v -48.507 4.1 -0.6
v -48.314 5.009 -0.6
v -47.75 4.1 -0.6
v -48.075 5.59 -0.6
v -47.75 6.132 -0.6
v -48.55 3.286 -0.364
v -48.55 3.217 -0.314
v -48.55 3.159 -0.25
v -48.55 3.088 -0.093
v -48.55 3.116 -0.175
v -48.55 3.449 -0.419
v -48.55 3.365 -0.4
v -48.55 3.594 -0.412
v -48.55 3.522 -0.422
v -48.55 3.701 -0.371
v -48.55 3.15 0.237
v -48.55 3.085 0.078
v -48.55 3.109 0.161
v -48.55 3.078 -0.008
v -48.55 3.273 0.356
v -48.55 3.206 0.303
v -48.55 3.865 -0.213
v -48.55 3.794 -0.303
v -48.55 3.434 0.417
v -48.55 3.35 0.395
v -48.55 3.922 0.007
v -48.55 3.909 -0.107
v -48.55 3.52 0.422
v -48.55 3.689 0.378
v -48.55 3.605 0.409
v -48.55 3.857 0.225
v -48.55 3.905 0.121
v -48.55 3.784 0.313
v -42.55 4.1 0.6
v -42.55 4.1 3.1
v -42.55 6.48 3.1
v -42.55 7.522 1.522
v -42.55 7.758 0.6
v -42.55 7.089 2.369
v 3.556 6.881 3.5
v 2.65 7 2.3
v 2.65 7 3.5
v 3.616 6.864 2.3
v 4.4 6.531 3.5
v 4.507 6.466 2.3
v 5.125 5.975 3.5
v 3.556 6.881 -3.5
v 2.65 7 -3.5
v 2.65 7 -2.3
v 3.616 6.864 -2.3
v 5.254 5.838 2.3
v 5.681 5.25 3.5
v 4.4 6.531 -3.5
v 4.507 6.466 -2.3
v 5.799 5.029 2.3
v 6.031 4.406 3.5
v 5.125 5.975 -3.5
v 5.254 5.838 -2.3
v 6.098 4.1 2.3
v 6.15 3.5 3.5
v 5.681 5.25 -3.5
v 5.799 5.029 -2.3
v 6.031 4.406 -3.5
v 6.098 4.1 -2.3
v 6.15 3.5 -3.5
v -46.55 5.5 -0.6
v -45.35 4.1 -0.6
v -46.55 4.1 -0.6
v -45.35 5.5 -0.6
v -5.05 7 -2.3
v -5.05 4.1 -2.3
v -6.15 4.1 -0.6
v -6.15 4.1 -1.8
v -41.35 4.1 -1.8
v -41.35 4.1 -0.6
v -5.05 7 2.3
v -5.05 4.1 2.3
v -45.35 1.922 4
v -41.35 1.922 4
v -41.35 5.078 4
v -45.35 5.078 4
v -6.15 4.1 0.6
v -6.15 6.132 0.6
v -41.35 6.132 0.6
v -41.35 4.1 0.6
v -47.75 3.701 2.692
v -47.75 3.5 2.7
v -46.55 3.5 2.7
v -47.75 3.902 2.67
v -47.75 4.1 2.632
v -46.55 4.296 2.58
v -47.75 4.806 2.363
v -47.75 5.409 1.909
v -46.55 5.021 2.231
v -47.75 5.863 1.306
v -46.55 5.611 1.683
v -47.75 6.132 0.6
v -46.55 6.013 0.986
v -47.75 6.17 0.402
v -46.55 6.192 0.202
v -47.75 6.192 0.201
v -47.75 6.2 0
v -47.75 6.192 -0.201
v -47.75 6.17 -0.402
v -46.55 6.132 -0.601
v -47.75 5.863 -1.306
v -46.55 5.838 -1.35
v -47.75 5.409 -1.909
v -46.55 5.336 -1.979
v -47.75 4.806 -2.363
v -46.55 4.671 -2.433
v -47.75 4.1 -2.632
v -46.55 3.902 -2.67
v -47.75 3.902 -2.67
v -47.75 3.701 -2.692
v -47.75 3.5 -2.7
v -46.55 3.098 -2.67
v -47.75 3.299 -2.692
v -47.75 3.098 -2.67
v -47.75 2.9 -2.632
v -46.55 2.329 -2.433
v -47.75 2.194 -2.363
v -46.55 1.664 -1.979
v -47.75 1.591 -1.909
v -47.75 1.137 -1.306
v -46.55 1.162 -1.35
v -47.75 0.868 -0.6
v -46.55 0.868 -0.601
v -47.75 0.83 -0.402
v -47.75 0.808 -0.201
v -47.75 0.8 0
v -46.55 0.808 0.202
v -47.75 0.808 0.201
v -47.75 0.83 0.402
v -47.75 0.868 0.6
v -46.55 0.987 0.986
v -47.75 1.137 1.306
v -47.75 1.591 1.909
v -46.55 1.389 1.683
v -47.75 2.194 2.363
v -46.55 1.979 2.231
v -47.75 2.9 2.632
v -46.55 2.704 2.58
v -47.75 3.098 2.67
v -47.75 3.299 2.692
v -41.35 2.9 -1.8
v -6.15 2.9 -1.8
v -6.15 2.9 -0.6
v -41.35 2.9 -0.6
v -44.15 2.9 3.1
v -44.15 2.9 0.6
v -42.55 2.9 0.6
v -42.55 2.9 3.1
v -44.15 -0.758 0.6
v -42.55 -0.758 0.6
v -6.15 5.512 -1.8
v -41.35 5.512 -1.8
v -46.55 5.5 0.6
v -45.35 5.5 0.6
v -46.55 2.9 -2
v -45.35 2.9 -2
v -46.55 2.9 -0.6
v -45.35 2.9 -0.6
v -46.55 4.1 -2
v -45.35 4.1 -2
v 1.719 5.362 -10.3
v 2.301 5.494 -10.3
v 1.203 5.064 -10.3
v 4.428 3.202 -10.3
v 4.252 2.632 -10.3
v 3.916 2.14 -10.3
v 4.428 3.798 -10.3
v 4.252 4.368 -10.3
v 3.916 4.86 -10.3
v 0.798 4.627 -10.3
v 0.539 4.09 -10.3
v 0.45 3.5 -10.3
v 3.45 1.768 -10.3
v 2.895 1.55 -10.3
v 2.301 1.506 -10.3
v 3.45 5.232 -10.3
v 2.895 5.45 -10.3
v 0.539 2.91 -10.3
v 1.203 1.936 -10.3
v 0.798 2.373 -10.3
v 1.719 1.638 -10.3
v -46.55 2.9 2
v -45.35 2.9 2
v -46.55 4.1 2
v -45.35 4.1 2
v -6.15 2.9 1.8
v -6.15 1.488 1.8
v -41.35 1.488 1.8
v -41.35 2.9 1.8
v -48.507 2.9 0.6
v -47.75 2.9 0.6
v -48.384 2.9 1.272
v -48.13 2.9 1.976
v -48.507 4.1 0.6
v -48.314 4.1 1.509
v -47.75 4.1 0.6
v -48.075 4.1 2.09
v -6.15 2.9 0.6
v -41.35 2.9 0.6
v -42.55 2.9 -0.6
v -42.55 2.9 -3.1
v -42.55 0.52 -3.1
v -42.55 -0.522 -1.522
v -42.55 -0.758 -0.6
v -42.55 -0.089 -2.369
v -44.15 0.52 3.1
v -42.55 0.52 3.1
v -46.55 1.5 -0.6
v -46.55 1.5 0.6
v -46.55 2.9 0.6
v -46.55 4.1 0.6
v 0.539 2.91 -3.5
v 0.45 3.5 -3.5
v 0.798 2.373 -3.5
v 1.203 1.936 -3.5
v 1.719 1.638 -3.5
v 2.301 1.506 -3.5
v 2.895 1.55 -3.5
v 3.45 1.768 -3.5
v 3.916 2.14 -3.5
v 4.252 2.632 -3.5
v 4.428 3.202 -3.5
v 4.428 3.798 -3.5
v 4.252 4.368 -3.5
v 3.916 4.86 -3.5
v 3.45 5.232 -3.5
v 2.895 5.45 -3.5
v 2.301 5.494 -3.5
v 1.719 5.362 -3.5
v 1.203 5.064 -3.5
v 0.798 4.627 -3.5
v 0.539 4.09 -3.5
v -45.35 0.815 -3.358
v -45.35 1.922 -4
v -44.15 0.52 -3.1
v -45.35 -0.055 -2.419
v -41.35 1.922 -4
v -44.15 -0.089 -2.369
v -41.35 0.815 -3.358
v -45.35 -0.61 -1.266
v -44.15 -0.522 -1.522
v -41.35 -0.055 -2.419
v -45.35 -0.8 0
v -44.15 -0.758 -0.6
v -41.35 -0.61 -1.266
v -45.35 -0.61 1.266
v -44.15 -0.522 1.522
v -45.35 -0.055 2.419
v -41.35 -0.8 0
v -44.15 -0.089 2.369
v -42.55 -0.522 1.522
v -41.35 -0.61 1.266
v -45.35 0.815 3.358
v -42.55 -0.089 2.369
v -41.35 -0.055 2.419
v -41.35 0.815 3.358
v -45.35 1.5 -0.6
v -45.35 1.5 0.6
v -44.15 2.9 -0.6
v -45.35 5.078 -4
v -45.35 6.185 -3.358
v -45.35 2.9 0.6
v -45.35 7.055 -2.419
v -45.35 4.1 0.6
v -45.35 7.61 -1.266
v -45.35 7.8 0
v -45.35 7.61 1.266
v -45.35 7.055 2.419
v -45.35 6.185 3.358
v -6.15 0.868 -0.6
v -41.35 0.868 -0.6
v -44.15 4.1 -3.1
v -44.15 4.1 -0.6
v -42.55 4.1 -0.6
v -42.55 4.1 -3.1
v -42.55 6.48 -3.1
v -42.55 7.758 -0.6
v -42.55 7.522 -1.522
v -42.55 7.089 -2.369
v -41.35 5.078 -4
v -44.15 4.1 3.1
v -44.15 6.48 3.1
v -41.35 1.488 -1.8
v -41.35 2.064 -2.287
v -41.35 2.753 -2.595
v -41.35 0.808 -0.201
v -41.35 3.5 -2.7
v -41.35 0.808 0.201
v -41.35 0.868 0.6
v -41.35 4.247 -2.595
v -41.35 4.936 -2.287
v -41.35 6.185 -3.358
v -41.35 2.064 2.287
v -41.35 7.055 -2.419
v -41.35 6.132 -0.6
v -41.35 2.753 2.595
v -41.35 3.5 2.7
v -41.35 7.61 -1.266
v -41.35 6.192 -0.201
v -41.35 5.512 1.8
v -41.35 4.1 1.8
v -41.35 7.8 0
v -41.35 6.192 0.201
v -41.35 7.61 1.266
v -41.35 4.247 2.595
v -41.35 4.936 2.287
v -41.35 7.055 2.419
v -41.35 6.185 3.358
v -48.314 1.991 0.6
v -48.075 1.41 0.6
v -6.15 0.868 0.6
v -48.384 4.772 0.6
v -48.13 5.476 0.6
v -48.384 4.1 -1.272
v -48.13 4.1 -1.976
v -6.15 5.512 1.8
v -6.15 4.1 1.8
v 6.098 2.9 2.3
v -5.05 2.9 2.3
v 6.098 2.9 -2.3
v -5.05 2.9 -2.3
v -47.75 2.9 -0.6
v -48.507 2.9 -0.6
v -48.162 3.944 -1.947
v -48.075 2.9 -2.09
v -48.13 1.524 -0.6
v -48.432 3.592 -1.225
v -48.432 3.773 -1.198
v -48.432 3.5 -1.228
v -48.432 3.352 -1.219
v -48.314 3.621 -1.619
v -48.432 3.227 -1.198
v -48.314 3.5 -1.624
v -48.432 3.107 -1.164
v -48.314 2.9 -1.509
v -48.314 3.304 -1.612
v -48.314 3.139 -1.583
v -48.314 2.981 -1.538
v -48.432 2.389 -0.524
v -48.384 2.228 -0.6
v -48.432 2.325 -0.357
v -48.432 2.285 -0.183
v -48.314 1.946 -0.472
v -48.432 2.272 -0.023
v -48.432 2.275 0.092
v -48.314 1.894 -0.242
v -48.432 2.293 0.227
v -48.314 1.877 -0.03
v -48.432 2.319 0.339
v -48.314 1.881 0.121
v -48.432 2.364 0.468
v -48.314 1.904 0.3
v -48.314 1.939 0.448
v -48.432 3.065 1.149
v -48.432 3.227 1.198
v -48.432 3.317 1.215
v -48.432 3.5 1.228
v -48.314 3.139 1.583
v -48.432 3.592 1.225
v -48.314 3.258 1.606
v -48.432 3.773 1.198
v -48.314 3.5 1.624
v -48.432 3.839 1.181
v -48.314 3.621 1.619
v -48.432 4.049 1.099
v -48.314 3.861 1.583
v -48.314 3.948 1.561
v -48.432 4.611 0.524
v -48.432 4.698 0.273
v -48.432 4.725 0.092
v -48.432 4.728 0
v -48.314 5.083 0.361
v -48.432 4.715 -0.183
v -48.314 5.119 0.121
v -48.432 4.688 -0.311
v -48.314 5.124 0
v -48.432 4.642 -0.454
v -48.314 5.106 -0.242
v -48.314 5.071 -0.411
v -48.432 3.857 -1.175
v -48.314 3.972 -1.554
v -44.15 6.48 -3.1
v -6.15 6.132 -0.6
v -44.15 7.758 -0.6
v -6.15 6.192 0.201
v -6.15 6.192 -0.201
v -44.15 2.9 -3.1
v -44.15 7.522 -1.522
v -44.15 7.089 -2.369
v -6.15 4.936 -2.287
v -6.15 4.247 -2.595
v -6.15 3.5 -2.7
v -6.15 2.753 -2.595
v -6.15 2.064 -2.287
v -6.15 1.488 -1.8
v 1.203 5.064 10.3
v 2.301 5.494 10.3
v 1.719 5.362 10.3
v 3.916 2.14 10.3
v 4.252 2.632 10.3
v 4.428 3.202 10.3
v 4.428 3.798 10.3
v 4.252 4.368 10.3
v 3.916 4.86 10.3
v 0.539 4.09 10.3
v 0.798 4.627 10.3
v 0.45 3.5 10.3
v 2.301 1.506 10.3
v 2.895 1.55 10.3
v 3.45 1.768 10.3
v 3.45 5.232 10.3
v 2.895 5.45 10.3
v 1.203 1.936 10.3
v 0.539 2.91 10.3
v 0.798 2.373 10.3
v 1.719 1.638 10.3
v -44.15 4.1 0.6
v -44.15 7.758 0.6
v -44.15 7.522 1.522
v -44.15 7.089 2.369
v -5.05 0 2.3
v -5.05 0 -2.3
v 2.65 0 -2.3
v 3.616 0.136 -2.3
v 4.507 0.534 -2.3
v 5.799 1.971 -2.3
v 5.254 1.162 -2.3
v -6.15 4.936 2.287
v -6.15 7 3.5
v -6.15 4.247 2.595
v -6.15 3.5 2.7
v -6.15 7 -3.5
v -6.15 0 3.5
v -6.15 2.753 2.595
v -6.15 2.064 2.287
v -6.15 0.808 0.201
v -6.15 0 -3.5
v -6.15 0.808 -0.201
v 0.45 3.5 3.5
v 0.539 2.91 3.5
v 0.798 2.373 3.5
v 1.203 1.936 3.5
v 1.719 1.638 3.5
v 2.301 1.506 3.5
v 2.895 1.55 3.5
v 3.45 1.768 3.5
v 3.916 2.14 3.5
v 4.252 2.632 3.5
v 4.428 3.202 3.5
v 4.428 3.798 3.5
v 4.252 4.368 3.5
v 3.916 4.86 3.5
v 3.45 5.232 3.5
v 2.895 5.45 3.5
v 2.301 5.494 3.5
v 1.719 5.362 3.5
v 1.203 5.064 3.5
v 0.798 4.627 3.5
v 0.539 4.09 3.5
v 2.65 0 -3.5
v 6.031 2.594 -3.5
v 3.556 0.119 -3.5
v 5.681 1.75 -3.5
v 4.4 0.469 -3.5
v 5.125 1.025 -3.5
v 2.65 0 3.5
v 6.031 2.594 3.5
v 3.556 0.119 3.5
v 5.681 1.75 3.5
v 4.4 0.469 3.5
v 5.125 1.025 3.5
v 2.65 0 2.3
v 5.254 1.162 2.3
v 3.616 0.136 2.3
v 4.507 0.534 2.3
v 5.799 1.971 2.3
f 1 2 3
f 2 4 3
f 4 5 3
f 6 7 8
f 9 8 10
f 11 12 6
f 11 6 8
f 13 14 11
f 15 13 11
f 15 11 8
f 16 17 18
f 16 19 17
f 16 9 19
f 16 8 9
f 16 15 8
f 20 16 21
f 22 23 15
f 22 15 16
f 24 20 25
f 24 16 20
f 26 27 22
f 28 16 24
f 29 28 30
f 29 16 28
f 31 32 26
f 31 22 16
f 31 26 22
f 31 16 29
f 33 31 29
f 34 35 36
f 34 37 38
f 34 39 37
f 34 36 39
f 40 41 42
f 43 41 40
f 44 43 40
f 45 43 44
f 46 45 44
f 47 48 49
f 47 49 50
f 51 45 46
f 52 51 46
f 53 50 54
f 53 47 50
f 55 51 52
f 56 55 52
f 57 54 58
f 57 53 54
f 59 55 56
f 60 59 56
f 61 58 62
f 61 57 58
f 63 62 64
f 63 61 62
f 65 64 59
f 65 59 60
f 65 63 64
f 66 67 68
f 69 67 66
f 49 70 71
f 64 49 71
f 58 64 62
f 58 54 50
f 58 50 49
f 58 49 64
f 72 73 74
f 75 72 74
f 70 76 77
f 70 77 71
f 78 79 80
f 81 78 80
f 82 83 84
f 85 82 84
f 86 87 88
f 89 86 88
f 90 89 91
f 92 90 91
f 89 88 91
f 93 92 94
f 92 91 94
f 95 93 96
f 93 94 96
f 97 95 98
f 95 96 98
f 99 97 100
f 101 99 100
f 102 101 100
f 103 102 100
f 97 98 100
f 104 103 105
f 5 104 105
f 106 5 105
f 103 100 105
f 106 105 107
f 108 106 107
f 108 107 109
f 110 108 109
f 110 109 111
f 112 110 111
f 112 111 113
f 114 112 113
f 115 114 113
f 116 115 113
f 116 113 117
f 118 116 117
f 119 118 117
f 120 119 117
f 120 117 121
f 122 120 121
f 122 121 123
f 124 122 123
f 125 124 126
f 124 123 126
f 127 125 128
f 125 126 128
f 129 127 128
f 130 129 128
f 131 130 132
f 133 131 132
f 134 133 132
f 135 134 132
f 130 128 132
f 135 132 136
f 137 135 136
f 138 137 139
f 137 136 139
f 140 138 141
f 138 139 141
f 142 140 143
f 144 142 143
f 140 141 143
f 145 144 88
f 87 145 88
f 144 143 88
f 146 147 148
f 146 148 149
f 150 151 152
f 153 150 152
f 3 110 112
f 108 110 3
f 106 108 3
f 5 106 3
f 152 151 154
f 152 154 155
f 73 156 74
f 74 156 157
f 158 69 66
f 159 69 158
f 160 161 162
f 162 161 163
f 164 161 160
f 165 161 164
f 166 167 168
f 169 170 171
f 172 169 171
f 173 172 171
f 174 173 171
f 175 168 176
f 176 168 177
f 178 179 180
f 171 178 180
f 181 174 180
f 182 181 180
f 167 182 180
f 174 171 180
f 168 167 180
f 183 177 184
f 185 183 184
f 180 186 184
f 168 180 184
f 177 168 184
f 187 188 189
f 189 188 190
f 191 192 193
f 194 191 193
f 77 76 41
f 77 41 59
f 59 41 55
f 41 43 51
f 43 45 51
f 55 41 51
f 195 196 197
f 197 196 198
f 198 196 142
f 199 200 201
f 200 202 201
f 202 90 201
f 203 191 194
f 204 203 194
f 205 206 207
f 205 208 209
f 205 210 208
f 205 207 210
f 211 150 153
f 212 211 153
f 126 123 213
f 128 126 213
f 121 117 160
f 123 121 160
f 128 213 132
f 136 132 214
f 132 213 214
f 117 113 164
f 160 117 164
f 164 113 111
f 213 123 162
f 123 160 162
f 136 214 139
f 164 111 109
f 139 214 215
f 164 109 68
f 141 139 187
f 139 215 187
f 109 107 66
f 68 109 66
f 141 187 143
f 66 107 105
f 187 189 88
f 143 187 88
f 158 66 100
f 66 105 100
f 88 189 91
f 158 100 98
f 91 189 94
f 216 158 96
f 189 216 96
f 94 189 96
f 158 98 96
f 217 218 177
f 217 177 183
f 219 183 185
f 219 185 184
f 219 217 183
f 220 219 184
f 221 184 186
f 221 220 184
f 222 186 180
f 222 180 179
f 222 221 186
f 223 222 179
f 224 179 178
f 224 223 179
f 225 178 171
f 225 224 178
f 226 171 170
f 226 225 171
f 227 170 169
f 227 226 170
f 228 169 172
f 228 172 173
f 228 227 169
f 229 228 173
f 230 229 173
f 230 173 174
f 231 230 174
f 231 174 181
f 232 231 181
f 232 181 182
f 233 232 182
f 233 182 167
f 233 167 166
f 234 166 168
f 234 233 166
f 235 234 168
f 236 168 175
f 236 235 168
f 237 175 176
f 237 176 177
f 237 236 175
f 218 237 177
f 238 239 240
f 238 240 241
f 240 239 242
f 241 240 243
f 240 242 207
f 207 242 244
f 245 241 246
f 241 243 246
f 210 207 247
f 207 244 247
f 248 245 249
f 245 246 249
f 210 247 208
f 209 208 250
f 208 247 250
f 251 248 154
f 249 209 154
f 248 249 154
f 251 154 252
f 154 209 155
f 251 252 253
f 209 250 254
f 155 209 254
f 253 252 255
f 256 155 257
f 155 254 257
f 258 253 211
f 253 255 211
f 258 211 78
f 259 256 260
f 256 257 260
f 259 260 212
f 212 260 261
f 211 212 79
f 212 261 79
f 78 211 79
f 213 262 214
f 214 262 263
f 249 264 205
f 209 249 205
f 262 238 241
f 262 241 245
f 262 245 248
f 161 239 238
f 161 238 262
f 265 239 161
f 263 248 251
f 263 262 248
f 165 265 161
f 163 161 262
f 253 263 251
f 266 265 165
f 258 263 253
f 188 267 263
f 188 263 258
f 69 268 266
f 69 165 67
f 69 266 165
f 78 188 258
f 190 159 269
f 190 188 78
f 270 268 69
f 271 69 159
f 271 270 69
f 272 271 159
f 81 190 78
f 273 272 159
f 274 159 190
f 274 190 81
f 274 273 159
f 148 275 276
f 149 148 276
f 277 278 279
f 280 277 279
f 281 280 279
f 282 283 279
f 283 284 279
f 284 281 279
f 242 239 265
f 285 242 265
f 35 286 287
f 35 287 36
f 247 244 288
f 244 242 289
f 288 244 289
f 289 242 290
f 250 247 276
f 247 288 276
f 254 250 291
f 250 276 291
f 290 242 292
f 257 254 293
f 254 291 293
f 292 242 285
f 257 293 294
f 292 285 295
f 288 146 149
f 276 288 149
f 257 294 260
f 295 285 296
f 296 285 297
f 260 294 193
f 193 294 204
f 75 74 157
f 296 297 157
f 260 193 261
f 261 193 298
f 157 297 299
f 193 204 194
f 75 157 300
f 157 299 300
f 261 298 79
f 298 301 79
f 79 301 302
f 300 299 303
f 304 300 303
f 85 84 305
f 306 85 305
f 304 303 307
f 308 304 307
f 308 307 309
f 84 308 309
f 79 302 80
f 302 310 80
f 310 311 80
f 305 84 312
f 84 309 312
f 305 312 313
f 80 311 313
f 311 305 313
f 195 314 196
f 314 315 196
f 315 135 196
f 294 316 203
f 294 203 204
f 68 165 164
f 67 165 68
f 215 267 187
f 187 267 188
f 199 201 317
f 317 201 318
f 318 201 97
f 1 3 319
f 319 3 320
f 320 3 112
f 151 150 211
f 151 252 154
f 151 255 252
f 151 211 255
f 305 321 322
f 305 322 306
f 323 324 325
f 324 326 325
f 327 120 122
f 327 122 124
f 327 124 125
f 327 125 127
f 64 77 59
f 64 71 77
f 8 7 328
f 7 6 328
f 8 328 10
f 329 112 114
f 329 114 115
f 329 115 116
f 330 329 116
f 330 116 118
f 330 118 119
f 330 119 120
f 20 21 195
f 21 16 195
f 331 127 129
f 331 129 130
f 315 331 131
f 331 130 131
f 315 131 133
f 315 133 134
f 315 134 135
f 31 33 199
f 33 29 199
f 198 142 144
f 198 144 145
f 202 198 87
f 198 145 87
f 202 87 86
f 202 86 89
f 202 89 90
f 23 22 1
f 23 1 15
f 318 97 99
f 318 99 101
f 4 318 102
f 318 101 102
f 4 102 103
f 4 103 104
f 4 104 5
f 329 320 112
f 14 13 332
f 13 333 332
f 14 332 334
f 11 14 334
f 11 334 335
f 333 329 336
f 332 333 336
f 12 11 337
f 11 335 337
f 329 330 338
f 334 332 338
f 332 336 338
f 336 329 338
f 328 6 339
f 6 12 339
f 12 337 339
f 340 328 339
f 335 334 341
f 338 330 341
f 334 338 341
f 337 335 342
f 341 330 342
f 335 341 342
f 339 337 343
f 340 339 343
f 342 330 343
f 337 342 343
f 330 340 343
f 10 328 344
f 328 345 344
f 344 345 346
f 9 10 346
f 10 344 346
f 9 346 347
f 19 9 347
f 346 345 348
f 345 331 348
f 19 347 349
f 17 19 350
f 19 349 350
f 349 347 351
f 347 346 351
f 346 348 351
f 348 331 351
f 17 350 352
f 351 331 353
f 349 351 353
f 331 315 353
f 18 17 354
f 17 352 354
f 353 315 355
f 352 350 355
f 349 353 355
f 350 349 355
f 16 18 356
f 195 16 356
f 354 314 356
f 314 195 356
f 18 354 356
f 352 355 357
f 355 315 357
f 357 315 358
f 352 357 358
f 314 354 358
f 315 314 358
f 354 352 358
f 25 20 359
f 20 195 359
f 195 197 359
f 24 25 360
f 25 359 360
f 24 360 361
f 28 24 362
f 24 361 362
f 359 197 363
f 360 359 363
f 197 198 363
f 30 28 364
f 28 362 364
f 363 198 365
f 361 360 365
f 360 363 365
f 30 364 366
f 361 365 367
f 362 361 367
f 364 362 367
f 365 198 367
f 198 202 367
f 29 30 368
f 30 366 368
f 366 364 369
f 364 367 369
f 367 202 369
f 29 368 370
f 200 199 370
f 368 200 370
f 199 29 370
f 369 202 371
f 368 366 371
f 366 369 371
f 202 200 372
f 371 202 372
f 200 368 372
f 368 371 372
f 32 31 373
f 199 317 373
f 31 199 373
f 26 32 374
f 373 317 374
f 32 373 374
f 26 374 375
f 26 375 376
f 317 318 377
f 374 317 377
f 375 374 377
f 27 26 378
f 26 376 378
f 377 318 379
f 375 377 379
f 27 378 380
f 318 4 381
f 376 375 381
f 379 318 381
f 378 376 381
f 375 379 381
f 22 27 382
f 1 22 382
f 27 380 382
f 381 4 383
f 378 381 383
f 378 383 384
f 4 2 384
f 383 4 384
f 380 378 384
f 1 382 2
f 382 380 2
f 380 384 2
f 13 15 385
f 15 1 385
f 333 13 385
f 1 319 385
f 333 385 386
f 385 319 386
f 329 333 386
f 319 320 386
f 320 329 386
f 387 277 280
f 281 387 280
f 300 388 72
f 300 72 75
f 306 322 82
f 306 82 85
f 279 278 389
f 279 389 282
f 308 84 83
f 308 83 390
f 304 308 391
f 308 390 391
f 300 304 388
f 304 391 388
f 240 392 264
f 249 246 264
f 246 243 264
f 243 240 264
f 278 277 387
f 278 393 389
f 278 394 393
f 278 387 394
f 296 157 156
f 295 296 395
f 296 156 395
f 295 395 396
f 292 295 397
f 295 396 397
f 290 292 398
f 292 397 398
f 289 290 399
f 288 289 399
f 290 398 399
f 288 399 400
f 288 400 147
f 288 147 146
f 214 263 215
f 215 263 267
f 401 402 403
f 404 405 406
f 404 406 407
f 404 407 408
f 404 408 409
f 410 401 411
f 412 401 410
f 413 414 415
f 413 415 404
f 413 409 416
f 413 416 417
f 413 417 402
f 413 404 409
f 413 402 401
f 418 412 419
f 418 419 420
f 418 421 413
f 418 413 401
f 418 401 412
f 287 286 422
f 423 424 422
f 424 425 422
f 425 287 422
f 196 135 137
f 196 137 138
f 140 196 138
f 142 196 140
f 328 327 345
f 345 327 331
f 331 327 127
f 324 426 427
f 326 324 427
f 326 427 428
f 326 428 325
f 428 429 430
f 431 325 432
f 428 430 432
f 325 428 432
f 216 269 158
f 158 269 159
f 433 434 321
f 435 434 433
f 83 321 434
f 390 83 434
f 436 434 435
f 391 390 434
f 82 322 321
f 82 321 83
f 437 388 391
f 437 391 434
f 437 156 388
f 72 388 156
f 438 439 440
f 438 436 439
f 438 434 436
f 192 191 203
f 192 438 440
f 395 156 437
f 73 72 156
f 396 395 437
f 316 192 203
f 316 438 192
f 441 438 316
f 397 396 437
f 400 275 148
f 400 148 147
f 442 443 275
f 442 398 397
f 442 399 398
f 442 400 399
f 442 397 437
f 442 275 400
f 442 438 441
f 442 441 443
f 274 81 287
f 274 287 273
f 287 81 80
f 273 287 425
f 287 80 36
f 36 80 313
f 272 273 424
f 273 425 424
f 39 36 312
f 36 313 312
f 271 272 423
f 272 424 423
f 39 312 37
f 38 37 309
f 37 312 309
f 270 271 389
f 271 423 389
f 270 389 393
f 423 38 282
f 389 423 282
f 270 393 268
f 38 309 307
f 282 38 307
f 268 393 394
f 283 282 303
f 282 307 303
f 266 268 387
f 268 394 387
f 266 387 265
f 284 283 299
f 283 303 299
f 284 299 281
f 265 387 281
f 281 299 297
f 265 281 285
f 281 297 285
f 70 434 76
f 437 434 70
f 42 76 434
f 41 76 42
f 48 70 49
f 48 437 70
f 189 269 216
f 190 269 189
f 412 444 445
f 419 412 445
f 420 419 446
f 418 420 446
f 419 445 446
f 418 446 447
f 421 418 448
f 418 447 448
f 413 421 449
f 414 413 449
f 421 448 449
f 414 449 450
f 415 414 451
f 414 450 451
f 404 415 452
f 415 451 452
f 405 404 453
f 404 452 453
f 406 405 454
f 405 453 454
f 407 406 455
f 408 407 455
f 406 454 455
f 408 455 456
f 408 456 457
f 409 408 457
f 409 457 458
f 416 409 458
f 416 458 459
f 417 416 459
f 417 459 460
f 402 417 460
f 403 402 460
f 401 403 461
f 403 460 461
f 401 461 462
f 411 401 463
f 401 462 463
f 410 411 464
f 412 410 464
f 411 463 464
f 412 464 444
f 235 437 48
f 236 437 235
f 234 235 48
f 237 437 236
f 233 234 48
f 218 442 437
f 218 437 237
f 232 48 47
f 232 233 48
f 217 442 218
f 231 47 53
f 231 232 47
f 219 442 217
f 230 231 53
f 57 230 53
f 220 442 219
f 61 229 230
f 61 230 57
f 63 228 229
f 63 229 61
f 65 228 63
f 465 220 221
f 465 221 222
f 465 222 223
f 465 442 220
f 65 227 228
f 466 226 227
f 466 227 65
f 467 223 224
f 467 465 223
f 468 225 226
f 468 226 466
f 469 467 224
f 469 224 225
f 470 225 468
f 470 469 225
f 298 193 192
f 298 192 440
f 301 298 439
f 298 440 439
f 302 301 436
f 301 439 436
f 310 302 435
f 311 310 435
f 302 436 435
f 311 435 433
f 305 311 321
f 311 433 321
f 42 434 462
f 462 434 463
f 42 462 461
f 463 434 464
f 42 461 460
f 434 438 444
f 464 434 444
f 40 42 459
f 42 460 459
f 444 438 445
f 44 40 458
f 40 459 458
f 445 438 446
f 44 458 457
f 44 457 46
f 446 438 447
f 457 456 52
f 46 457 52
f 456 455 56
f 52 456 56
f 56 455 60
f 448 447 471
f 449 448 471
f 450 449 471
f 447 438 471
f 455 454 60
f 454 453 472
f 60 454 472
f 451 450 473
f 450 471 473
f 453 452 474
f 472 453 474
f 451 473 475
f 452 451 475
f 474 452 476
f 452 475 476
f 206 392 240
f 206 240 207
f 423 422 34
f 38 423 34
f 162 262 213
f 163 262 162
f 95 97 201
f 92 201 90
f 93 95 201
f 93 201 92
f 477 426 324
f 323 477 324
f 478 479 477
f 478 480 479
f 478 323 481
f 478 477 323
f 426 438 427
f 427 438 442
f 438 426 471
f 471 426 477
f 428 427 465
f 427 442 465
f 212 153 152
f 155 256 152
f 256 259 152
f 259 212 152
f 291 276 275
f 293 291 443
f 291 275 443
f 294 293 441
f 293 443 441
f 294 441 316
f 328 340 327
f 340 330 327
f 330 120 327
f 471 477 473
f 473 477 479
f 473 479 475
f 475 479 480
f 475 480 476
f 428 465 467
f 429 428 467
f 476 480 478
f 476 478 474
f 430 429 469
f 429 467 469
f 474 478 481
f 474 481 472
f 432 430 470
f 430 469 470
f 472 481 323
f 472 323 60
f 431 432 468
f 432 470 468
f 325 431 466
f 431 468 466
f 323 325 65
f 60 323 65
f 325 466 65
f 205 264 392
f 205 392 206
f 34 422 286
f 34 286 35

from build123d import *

# Parameters (mm, degrees)
SKETCH1_W                 = 12.3
SKETCH1_H                 = 7
BOSS_EXTRUDE1_DEPTH       = 7
SKETCH2_W                 = 11.2
SKETCH2_H                 = 4.6
CUT_EXTRUDE1_DEPTH        = 2.9
SKETCH4_R                 = 2
BOSS_EXTRUDE2_DEPTH       = 6.8
SKETCH5_R                 = 2.7
BOSS_EXTRUDE3_DEPTH       = 35.2
SKETCH6_R                 = 4.3
BOSS_EXTRUDE4_DEPTH       = 4
SKETCH7_W                 = 35.2
SKETCH7_H                 = 1.2
CUT_EXTRUDE2_DEPTH        = 2.9
MIRROR4_COPY_1_SKETCH_W   = 35.2
MIRROR4_COPY_1_SKETCH_H   = 1.2
MIRROR4_COPY_1_DEPTH      = 2.9
CUT_EXTRUDE3_REACH        = 48.762
CUT_EXTRUDE3_END_RADIUS   = 4.3
SKETCH9_W                 = 1.6
SKETCH9_H                 = 2.5
MIRROR6_COPY_1_REACH      = 48.762
MIRROR6_COPY_1_END_RADIUS = 4.3
MIRROR6_COPY_1_SKETCH_W   = 1.6
MIRROR6_COPY_1_SKETCH_H   = 2.5
SKETCH10_W                = 1.4
SKETCH10_H                = 1.2
SKETCH10_W_2              = 1.2
SKETCH10_H_2              = 1.4
BOSS_EXTRUDE5_DEPTH       = 1.2
SKETCH11_R                = 2.7
BOSS_EXTRUDE6_DEPTH       = 1.2
SKETCH12_W                = 1.2
SKETCH12_H                = 1.2
BOSS_EXTRUDE9_DEPTH       = 0.8
FILLET3_R                 = 3.5
SKETCH14_W                = 1
SKETCH14_H                = 12
CUT_EXTRUDE8_DEPTH        = 5


with BuildPart() as part:
    # Sketch1 → Boss-Extrude1 (new body)
    with BuildSketch(Plane(origin=(0, 0, 0), x_dir=(1, 0, 0), z_dir=(0, 1, 0))):
        Rectangle(SKETCH1_W, SKETCH1_H)
    extrude(amount=BOSS_EXTRUDE1_DEPTH)

    # Sketch2 → Cut-Extrude1 (cut)
    with BuildSketch(Plane(origin=(0, 7, 0), x_dir=(1, 0, 0), z_dir=(0, 1, 0))):
        with Locations((0.55, 0)):
            Rectangle(SKETCH2_W, SKETCH2_H)
    cut_extrude1 = extrude(amount=-CUT_EXTRUDE1_DEPTH, mode=Mode.SUBTRACT)

    # Mirror1: Cut-Extrude1 across plane
    add(cut_extrude1.mirror(Plane.ZX.offset(3.5)), mode=Mode.SUBTRACT)

    # Sketch4 → Boss-Extrude2 (add)
    with BuildSketch(Plane.XY.offset(3.5)):
        with Locations(Location((2.45, 3.5, 0), (0, 0, 180))):
            Circle(SKETCH4_R)
    boss_extrude2 = extrude(amount=BOSS_EXTRUDE2_DEPTH)

    # Mirror2: Boss-Extrude2 across plane
    add(boss_extrude2.mirror(Plane.XY))

    # Sketch5 → Boss-Extrude3 (add)
    with BuildSketch(Plane.ZY.offset(6.15)):
        with Locations((0, 3.5)):
            Circle(SKETCH5_R)
    extrude(amount=BOSS_EXTRUDE3_DEPTH)

    # Sketch6 → Boss-Extrude4 (add)
    with BuildSketch(Plane.ZY.offset(41.35)):
        with Locations((0, 3.5)):
            Circle(SKETCH6_R)
    extrude(amount=BOSS_EXTRUDE4_DEPTH)

    # Sketch7 → Cut-Extrude2 (cut)
    with BuildSketch(Plane(origin=(0, 0, 0), x_dir=(-1, 0, 0), z_dir=(0, -1, 0))):
        with Locations((23.75, 1.2)):
            Rectangle(SKETCH7_W, SKETCH7_H)
    cut_extrude2 = extrude(amount=-CUT_EXTRUDE2_DEPTH, mode=Mode.SUBTRACT)

    # Mirror3: Cut-Extrude2 across plane
    add(cut_extrude2.mirror(Plane.ZX.offset(3.5)), mode=Mode.SUBTRACT)

    # Mirror4: Cut-Extrude2 across plane
    add(cut_extrude2.mirror(Plane.XY), mode=Mode.SUBTRACT)

    # Mirror4 copy 1 sketch → Mirror4 copy 1 (cut)
    with BuildSketch(Plane(origin=(0, 7, 0), x_dir=(-1, 0, 0), z_dir=(0, 1, 0))):
        with Locations((23.75, 1.2)):
            Rectangle(MIRROR4_COPY_1_SKETCH_W, MIRROR4_COPY_1_SKETCH_H)
    extrude(amount=-MIRROR4_COPY_1_DEPTH, mode=Mode.SUBTRACT)

    # Cut-Extrude3: up to this cylinder (the profile starts inside it)
    cut_extrude3_end = Plane(origin=(-43.35, 3.5, 0), z_dir=(1, 0, 0)) * Cylinder(CUT_EXTRUDE3_END_RADIUS, 107.124, mode=Mode.PRIVATE)
    # Sketch9 → Cut-Extrude3 (cut, up to the surface)
    with BuildSketch(Plane(origin=(0, 4.1, 0), x_dir=(1, 0, 0), z_dir=(0, 1, 0)), mode=Mode.PRIVATE) as cut_extrude3_sk1:
        with Locations((-43.35, -1.85)):
            Rectangle(SKETCH9_W, SKETCH9_H)
    cut_extrude3_tool1 = extrude(cut_extrude3_sk1.sketch, amount=CUT_EXTRUDE3_REACH, mode=Mode.PRIVATE) & cut_extrude3_end
    cut_extrude3 = cut_extrude3_tool1.solids().sort_by_distance((-43.35, 4.1, 1.85))[0]
    add(cut_extrude3, mode=Mode.SUBTRACT)

    # Mirror5: Cut-Extrude3 across plane
    add(cut_extrude3.mirror(Plane.ZX.offset(3.5)), mode=Mode.SUBTRACT)

    # Mirror6: Cut-Extrude3 across plane
    add(cut_extrude3.mirror(Plane.XY), mode=Mode.SUBTRACT)

    # Mirror6 copy 1: up to this cylinder (the profile starts inside it)
    mirror6_copy_1_end = Plane(origin=(-43.35, 3.5, 0), z_dir=(1, 0, 0)) * Cylinder(MIRROR6_COPY_1_END_RADIUS, 107.124, mode=Mode.PRIVATE)
    # Mirror6 copy 1 sketch → Mirror6 copy 1 (cut, up to the surface)
    with BuildSketch(Plane.XZ.offset(-2.9), mode=Mode.PRIVATE) as mirror6_copy_1_sk1:
        with Locations((-43.35, -1.85)):
            Rectangle(MIRROR6_COPY_1_SKETCH_W, MIRROR6_COPY_1_SKETCH_H)
    mirror6_copy_1_tool1 = extrude(mirror6_copy_1_sk1.sketch, amount=MIRROR6_COPY_1_REACH, mode=Mode.PRIVATE) & mirror6_copy_1_end
    add(mirror6_copy_1_tool1.solids().sort_by_distance((-43.35, 4.1, 1.85))[0], mode=Mode.SUBTRACT)

    # Sketch10 → Boss-Extrude5 (add)
    with BuildSketch(Plane.ZY.offset(45.35)):
        with Locations((1.3, 3.5)):
            Rectangle(SKETCH10_W, SKETCH10_H)
        with Locations((0, 2.2)):
            Rectangle(SKETCH10_W_2, SKETCH10_H_2)
        with Locations((-1.3, 3.5)):
            Rectangle(SKETCH10_W, SKETCH10_H)
        with Locations((0, 4.8)):
            Rectangle(SKETCH10_W_2, SKETCH10_H_2)
        with Locations((0, 3.5)):
            Rectangle(SKETCH10_W_2, SKETCH10_H)
    extrude(amount=BOSS_EXTRUDE5_DEPTH)

    # Sketch11 → Boss-Extrude6 (add)
    with BuildSketch(Plane.ZY.offset(46.55)):
        with Locations((0, 3.5)):
            Circle(SKETCH11_R)
    extrude(amount=BOSS_EXTRUDE6_DEPTH)

    # Sketch12 → Boss-Extrude9 (add)
    with BuildSketch(Plane.ZY.offset(47.75)):
        with BuildLine():
            Line((-2.632489316, 2.9), (-0.6, 2.9))
            Line((-0.6, 2.9), (-0.6, 4.1))
            Line((-0.6, 4.1), (-2.632489316, 4.1))
            ThreePointArc((-2.632489316, 4.1), (-2.683069246, 3.801893066), (-2.7, 3.5))
            ThreePointArc((-2.7, 3.5), (-2.683069246, 3.198106934), (-2.632489316, 2.9))
        make_face()
        with BuildLine():
            Line((-0.6, 4.1), (0.6, 4.1))
            Line((0.6, 4.1), (0.6, 6.132489316))
            ThreePointArc((0.6, 6.132489316), (0.301893066, 6.183069246), (0, 6.2))
            ThreePointArc((0, 6.2), (-0.301893066, 6.183069246), (-0.6, 6.132489316))
            Line((-0.6, 6.132489316), (-0.6, 4.1))
        make_face()
        with BuildLine():
            Line((0.6, 2.9), (2.632489316, 2.9))
            ThreePointArc((2.632489316, 2.9), (2.683069246, 3.198106934), (2.7, 3.5))
            ThreePointArc((2.7, 3.5), (2.683069246, 3.801893066), (2.632489316, 4.1))
            Line((2.632489316, 4.1), (0.6, 4.1))
            Line((0.6, 4.1), (0.6, 2.9))
        make_face()
        with BuildLine():
            Line((0.6, 0.867510684), (0.6, 2.9))
            Line((0.6, 2.9), (-0.6, 2.9))
            Line((-0.6, 2.9), (-0.6, 0.867510684))
            ThreePointArc((-0.6, 0.867510684), (-0.301893067, 0.816930754), (-2e-09, 0.8))
            ThreePointArc((-2e-09, 0.8), (0.301893065, 0.816930754), (0.6, 0.867510684))
        make_face()
        with Locations((0, 3.5)):
            Rectangle(SKETCH12_W, SKETCH12_H)
    extrude(amount=BOSS_EXTRUDE9_DEPTH)

    # Sketch13 → Cut-Revolve6 (revolve, cut)
    with BuildSketch(Plane.XY, mode=Mode.PRIVATE) as cut_revolve6_sk:
        with BuildLine():
            Line((-47.75, 6.2), (-50.26441212, 6.868281128))
            Line((-50.26441212, 6.868281128), (-50.691294746, 5.219710686))
            Line((-50.691294746, 5.219710686), (-49.924832778, 3.5))
            Line((-49.924832778, 3.5), (-48.55, 3.5))
            ThreePointArc((-48.55, 3.5), (-48.380201095, 4.918207732), (-47.75, 6.2))
        make_face()
    revolve(cut_revolve6_sk.sketch.rotate(Axis((-48.75, 3.5, 0), (-1, 0, 0)), 77.160411593), axis=Axis((-48.75, 3.5, 0), (-1, 0, 0)), mode=Mode.SUBTRACT)

    # Fillet3
    fillet3_edges = [part.edges().sort_by_distance(p)[0] for p in [
        (6.15, 0, 2.9),
        (6.15, 7, 2.9),
    ]]
    fillet(fillet3_edges, radius=FILLET3_R - 0.0001)  # a hair under: the kernel refuses the full size

    # Sketch14 → Cut-Extrude8 (cut)
    with BuildSketch(Plane.ZY.offset(45.35)):
        with Locations((-4.5, 3.5)):
            Rectangle(SKETCH14_W, SKETCH14_H)
        with Locations((4.5, 3.5)):
            Rectangle(SKETCH14_W, SKETCH14_H)
    extrude(amount=-CUT_EXTRUDE8_DEPTH, mode=Mode.SUBTRACT)


solid = part.part
